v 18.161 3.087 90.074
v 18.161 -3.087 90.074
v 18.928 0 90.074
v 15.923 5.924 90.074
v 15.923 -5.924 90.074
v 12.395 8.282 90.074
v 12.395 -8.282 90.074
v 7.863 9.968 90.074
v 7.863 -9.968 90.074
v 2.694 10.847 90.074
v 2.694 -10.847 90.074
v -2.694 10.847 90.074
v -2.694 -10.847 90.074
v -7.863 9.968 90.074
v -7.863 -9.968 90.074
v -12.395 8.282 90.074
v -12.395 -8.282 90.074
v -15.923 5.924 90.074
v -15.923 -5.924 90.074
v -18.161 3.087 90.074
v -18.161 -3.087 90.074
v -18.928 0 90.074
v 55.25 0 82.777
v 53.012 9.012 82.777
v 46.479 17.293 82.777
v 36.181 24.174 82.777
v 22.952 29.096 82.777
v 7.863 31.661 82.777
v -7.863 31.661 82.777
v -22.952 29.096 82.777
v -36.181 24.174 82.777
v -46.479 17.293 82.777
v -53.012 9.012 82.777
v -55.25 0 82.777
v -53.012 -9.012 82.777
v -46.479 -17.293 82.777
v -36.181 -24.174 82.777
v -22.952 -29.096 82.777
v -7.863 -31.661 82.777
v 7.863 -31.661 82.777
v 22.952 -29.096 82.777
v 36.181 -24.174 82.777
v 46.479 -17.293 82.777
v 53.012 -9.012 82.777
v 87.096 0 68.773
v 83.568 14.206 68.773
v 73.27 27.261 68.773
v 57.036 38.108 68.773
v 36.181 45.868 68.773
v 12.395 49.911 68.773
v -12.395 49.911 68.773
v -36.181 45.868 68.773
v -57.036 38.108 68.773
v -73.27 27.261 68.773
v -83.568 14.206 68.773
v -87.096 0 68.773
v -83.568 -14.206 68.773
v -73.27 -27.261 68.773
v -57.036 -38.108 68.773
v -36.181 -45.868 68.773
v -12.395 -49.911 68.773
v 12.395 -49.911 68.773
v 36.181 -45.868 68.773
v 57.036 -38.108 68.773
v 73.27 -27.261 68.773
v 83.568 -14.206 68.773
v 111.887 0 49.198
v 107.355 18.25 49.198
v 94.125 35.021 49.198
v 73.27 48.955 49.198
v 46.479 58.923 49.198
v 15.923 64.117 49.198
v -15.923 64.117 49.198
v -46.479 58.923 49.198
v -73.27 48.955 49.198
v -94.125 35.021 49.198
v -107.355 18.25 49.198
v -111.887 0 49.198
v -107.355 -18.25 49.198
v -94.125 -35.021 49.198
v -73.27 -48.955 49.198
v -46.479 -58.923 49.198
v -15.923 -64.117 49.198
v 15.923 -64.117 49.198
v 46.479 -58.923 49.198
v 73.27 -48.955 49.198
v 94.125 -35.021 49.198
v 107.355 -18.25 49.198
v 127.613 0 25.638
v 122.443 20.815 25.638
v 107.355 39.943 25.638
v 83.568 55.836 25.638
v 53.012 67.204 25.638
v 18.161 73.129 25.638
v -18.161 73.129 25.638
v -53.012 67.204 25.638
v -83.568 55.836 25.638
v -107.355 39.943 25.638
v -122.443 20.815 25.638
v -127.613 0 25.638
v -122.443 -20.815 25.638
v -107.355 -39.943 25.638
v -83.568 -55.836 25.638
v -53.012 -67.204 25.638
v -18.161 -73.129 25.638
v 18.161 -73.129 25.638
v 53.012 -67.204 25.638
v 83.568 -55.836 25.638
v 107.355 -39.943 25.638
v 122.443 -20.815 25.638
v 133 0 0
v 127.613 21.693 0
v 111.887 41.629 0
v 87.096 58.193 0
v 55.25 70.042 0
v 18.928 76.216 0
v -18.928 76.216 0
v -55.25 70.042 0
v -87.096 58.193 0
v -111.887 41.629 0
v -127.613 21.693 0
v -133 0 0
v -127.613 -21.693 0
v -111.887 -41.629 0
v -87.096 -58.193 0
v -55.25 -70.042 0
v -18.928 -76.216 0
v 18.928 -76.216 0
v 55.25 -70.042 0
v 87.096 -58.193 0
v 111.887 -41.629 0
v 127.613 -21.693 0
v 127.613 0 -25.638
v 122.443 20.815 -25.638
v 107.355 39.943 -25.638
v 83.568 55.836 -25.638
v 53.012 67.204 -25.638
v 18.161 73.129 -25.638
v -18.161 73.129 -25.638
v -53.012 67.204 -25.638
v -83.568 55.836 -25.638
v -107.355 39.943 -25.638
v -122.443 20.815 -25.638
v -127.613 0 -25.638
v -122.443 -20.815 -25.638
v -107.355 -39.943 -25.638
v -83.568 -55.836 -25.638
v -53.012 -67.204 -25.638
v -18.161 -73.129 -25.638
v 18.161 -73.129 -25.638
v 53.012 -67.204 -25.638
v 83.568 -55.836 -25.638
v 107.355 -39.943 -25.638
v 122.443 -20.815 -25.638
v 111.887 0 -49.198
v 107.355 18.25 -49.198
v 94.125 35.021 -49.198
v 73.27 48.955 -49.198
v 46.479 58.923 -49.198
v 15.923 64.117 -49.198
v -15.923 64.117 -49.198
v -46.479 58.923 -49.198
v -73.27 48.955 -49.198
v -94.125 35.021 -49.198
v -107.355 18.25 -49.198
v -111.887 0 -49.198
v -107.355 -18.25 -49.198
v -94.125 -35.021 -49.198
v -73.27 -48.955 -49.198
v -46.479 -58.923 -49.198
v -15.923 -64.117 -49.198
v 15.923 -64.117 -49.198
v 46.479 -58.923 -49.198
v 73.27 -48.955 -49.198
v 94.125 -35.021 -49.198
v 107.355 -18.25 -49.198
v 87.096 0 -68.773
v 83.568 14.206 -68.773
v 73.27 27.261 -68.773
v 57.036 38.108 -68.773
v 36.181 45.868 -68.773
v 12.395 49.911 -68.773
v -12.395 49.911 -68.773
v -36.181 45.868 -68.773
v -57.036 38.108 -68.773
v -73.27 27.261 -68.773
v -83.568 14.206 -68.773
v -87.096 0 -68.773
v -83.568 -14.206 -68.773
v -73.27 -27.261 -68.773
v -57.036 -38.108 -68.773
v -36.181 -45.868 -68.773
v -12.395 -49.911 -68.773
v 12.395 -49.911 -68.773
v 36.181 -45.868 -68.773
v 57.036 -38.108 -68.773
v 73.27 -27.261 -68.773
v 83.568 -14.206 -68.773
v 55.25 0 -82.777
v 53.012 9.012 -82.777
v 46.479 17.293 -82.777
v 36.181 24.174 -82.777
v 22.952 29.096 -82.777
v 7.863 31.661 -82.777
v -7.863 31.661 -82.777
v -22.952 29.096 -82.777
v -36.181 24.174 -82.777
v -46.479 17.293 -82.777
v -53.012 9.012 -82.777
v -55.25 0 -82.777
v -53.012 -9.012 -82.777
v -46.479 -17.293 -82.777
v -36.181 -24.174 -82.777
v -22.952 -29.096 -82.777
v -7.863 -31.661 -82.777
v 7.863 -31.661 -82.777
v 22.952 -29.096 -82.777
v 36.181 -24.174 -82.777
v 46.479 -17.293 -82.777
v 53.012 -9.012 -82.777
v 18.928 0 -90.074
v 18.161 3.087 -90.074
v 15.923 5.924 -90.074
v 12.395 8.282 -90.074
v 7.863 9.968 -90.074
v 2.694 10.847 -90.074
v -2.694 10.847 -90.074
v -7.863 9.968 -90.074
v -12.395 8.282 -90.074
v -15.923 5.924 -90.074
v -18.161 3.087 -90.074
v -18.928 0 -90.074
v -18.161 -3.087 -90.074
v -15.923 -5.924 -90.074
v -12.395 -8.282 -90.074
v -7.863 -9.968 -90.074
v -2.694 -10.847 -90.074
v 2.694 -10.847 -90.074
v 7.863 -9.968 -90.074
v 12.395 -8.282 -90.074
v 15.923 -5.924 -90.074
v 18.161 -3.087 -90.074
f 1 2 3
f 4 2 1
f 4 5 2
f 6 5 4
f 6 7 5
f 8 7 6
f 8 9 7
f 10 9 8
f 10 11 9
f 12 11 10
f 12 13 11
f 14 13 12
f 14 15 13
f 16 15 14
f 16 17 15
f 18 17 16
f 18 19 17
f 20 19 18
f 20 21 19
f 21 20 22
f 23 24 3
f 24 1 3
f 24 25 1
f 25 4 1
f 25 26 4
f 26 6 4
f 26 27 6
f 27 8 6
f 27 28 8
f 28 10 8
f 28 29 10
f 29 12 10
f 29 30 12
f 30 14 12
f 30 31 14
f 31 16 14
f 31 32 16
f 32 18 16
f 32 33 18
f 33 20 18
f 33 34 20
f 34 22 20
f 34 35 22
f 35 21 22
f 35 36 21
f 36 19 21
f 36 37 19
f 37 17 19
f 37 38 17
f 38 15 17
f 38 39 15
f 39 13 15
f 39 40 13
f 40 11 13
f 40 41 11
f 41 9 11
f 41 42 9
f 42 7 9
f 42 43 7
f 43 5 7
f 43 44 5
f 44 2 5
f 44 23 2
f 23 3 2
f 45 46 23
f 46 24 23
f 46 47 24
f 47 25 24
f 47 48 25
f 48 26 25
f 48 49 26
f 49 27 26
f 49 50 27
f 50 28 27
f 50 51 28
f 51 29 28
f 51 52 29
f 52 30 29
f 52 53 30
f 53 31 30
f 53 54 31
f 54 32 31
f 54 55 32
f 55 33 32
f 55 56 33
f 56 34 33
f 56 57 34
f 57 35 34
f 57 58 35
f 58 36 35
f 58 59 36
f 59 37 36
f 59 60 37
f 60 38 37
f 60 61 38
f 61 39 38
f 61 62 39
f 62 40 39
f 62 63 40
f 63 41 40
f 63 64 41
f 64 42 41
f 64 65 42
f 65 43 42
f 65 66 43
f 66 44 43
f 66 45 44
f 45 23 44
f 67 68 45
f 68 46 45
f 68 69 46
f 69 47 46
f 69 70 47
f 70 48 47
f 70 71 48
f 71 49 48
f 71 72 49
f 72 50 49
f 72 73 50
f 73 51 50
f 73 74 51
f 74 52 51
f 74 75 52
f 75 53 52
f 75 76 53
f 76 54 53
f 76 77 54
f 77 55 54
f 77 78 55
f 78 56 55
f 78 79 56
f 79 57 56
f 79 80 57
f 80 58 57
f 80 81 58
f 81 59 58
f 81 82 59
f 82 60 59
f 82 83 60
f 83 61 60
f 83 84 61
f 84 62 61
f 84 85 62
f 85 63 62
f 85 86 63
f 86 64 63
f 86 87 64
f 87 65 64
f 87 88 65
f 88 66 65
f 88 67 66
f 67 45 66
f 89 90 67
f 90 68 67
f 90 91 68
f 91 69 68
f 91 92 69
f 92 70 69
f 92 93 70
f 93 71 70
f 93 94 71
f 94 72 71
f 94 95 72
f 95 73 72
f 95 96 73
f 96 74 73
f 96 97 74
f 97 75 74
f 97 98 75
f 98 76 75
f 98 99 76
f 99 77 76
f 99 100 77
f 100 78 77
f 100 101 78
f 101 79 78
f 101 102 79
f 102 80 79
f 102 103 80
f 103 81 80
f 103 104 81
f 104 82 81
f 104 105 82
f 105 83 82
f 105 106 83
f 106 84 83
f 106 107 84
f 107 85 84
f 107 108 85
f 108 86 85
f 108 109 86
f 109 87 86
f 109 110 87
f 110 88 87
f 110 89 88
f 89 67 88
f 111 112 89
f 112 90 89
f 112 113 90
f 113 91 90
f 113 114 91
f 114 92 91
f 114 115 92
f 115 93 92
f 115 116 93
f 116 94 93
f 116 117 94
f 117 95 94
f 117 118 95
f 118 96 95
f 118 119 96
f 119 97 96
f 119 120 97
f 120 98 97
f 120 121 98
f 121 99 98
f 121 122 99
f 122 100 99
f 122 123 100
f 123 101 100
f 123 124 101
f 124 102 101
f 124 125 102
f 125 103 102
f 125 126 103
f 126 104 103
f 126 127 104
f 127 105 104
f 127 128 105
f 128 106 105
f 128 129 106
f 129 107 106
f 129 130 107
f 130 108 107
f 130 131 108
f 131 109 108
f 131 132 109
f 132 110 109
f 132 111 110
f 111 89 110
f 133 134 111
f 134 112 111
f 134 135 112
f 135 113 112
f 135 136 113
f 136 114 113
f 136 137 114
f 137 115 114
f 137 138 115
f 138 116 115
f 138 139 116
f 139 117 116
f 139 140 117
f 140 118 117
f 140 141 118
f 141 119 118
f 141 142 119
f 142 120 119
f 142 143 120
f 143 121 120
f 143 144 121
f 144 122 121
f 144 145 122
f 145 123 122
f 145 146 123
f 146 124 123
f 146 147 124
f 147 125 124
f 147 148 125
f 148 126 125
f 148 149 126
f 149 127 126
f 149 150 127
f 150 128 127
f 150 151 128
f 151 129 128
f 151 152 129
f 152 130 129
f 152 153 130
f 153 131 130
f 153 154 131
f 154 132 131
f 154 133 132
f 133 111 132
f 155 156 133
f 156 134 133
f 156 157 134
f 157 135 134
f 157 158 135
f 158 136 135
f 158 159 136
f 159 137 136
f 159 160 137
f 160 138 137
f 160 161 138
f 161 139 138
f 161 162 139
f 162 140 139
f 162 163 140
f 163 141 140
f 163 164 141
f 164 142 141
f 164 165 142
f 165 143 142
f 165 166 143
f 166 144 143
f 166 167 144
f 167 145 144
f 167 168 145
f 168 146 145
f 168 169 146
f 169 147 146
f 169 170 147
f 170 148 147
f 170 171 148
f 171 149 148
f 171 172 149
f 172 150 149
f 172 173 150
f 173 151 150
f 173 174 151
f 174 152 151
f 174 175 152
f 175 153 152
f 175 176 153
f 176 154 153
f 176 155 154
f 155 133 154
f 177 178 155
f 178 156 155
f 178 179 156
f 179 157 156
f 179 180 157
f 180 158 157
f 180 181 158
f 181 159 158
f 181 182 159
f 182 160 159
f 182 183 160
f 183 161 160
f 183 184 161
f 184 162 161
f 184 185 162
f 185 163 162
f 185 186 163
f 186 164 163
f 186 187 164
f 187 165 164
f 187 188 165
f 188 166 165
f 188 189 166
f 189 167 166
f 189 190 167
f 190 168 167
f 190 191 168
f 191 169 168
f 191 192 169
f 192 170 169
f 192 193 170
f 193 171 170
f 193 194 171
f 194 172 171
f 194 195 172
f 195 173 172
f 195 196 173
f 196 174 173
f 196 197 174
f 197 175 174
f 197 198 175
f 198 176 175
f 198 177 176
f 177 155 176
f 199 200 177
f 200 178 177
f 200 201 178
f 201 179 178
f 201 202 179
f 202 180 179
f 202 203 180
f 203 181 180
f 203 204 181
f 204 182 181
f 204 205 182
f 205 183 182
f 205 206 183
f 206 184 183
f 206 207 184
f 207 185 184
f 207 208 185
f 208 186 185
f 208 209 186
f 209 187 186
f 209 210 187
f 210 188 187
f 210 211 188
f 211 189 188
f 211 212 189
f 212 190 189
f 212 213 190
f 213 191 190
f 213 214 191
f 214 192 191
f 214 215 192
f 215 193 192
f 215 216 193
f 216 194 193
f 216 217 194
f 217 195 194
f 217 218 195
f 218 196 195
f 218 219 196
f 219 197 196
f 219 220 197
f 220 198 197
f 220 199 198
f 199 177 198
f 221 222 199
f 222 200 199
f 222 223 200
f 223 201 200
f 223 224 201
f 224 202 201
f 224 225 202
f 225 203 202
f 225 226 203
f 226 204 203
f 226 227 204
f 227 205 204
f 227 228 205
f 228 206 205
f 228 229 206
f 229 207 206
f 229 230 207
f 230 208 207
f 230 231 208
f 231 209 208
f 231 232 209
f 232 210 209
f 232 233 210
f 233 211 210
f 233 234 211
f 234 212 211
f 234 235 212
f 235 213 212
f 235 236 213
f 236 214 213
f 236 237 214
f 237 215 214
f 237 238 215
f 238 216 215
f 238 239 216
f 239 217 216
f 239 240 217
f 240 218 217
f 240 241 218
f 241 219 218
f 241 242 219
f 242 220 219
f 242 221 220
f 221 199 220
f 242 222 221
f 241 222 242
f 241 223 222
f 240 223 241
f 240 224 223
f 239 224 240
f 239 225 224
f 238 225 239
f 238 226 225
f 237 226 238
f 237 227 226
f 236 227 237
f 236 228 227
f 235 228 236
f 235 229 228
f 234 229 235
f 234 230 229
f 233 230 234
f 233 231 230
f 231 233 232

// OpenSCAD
// Generated by SolidPython 1.0.1 on 2020-07-29 00:46:54


scale(v = [19, 11, 13]) {
	sphere(r = 7);
}
/***********************************************
*********      SolidPython code:      **********
************************************************
 
# import packages: SolidPython
from solid import *
from solid.utils import *
from itertools import chain, combinations, permutations


class Resize:

    def __init__(self, scad_file):
        self.scad_file = scad_file
        #self.scad_file = import_scad(scad_file)
        # cone/cylinder param:
        self.r1 = 0
        self.r2 = 0
        self.h = 0
        # rectangular prism param:
        self.w = 0
        self.l = 0
        # ellipse param:
        self.r = 0

    # import OpenScad code (file name corresponds to shape)


    # classify shape + parameters
    def assign(self, param1, param2, param3):
        if self.scad_file == 'cone.scad':
            self.r1 = param1
            self.r2 = param2
            self.h = param3
        elif self.scad_file == 'cylinder.scad':
            self.r1 = param1
            self.r2 = param2
            self.h = param3
        elif self.scad_file == 'rectangularPrism.scad':
            self.h = param1
            self.l = param2
            self.w = param3
        else:
            self.r = param1
            self.h = param2

    # resize parameters
    def iterate(self):
        x = range(3, 20, 2)
        i = 1
        if self.scad_file == 'cone.scad':
            tempList = list(permutations(x, 2))
            for temp in tempList:
                param1 = temp[0]
                param2 = temp[1]
                filepath = 'produced_scad_files/' + 'cone' + str(param1) + '_' + str(param2) + '_' + '.scad'
                scad_render_to_file(cylinder(h=param1, r1=param2, r2=0), filepath)

        elif self.scad_file == 'cylinder.scad':
            tempList = list(permutations(x, 3))
            for temp in tempList:
                param1 = temp[0]
                param2 = temp[1]
                filepath = 'produced_scad_files/' + 'cylinder' + str(param1) + '_' + str(param2) + '_' + '.scad'
                scad_render_to_file(cylinder(h=param1, r1=param2, r2=param2), filepath)

        elif self.scad_file == 'rectangularPrism.scad':
            tempList = list(permutations(x, 3))
            for temp in tempList:
                param1 = temp[0]
                param2 = temp[1]
                param3 = temp[2]
                filepath = 'produced_scad_files/' + 'rectangularPrism' + str(param1) + '_' + str(param2) + '_' + str(
                    param3) + '.scad'
                scad_render_to_file(cube(size=(param1, param2, param3)), filepath)

        elif self.scad_file == 'ellipse.scad':
            tempList = list(permutations(x, 4))
            for temp in tempList:
                param1 = temp[0]
                param2 = temp[1]
                param3 = temp[2]
                param4 = temp[3]
                filepath = 'produced_scad_files/' + 'ellipse' + str(param1) + '_' + str(param2) + '_' + str(param3) + '_' + str(param4) + '.scad'
                scad_render_to_file(scale([param1, param2, param3])(sphere(r=param4)), filepath)

    def render_to_scadfile(self):
        scad_render_to_file(scad, 'example.scad') 
 
************************************************/
